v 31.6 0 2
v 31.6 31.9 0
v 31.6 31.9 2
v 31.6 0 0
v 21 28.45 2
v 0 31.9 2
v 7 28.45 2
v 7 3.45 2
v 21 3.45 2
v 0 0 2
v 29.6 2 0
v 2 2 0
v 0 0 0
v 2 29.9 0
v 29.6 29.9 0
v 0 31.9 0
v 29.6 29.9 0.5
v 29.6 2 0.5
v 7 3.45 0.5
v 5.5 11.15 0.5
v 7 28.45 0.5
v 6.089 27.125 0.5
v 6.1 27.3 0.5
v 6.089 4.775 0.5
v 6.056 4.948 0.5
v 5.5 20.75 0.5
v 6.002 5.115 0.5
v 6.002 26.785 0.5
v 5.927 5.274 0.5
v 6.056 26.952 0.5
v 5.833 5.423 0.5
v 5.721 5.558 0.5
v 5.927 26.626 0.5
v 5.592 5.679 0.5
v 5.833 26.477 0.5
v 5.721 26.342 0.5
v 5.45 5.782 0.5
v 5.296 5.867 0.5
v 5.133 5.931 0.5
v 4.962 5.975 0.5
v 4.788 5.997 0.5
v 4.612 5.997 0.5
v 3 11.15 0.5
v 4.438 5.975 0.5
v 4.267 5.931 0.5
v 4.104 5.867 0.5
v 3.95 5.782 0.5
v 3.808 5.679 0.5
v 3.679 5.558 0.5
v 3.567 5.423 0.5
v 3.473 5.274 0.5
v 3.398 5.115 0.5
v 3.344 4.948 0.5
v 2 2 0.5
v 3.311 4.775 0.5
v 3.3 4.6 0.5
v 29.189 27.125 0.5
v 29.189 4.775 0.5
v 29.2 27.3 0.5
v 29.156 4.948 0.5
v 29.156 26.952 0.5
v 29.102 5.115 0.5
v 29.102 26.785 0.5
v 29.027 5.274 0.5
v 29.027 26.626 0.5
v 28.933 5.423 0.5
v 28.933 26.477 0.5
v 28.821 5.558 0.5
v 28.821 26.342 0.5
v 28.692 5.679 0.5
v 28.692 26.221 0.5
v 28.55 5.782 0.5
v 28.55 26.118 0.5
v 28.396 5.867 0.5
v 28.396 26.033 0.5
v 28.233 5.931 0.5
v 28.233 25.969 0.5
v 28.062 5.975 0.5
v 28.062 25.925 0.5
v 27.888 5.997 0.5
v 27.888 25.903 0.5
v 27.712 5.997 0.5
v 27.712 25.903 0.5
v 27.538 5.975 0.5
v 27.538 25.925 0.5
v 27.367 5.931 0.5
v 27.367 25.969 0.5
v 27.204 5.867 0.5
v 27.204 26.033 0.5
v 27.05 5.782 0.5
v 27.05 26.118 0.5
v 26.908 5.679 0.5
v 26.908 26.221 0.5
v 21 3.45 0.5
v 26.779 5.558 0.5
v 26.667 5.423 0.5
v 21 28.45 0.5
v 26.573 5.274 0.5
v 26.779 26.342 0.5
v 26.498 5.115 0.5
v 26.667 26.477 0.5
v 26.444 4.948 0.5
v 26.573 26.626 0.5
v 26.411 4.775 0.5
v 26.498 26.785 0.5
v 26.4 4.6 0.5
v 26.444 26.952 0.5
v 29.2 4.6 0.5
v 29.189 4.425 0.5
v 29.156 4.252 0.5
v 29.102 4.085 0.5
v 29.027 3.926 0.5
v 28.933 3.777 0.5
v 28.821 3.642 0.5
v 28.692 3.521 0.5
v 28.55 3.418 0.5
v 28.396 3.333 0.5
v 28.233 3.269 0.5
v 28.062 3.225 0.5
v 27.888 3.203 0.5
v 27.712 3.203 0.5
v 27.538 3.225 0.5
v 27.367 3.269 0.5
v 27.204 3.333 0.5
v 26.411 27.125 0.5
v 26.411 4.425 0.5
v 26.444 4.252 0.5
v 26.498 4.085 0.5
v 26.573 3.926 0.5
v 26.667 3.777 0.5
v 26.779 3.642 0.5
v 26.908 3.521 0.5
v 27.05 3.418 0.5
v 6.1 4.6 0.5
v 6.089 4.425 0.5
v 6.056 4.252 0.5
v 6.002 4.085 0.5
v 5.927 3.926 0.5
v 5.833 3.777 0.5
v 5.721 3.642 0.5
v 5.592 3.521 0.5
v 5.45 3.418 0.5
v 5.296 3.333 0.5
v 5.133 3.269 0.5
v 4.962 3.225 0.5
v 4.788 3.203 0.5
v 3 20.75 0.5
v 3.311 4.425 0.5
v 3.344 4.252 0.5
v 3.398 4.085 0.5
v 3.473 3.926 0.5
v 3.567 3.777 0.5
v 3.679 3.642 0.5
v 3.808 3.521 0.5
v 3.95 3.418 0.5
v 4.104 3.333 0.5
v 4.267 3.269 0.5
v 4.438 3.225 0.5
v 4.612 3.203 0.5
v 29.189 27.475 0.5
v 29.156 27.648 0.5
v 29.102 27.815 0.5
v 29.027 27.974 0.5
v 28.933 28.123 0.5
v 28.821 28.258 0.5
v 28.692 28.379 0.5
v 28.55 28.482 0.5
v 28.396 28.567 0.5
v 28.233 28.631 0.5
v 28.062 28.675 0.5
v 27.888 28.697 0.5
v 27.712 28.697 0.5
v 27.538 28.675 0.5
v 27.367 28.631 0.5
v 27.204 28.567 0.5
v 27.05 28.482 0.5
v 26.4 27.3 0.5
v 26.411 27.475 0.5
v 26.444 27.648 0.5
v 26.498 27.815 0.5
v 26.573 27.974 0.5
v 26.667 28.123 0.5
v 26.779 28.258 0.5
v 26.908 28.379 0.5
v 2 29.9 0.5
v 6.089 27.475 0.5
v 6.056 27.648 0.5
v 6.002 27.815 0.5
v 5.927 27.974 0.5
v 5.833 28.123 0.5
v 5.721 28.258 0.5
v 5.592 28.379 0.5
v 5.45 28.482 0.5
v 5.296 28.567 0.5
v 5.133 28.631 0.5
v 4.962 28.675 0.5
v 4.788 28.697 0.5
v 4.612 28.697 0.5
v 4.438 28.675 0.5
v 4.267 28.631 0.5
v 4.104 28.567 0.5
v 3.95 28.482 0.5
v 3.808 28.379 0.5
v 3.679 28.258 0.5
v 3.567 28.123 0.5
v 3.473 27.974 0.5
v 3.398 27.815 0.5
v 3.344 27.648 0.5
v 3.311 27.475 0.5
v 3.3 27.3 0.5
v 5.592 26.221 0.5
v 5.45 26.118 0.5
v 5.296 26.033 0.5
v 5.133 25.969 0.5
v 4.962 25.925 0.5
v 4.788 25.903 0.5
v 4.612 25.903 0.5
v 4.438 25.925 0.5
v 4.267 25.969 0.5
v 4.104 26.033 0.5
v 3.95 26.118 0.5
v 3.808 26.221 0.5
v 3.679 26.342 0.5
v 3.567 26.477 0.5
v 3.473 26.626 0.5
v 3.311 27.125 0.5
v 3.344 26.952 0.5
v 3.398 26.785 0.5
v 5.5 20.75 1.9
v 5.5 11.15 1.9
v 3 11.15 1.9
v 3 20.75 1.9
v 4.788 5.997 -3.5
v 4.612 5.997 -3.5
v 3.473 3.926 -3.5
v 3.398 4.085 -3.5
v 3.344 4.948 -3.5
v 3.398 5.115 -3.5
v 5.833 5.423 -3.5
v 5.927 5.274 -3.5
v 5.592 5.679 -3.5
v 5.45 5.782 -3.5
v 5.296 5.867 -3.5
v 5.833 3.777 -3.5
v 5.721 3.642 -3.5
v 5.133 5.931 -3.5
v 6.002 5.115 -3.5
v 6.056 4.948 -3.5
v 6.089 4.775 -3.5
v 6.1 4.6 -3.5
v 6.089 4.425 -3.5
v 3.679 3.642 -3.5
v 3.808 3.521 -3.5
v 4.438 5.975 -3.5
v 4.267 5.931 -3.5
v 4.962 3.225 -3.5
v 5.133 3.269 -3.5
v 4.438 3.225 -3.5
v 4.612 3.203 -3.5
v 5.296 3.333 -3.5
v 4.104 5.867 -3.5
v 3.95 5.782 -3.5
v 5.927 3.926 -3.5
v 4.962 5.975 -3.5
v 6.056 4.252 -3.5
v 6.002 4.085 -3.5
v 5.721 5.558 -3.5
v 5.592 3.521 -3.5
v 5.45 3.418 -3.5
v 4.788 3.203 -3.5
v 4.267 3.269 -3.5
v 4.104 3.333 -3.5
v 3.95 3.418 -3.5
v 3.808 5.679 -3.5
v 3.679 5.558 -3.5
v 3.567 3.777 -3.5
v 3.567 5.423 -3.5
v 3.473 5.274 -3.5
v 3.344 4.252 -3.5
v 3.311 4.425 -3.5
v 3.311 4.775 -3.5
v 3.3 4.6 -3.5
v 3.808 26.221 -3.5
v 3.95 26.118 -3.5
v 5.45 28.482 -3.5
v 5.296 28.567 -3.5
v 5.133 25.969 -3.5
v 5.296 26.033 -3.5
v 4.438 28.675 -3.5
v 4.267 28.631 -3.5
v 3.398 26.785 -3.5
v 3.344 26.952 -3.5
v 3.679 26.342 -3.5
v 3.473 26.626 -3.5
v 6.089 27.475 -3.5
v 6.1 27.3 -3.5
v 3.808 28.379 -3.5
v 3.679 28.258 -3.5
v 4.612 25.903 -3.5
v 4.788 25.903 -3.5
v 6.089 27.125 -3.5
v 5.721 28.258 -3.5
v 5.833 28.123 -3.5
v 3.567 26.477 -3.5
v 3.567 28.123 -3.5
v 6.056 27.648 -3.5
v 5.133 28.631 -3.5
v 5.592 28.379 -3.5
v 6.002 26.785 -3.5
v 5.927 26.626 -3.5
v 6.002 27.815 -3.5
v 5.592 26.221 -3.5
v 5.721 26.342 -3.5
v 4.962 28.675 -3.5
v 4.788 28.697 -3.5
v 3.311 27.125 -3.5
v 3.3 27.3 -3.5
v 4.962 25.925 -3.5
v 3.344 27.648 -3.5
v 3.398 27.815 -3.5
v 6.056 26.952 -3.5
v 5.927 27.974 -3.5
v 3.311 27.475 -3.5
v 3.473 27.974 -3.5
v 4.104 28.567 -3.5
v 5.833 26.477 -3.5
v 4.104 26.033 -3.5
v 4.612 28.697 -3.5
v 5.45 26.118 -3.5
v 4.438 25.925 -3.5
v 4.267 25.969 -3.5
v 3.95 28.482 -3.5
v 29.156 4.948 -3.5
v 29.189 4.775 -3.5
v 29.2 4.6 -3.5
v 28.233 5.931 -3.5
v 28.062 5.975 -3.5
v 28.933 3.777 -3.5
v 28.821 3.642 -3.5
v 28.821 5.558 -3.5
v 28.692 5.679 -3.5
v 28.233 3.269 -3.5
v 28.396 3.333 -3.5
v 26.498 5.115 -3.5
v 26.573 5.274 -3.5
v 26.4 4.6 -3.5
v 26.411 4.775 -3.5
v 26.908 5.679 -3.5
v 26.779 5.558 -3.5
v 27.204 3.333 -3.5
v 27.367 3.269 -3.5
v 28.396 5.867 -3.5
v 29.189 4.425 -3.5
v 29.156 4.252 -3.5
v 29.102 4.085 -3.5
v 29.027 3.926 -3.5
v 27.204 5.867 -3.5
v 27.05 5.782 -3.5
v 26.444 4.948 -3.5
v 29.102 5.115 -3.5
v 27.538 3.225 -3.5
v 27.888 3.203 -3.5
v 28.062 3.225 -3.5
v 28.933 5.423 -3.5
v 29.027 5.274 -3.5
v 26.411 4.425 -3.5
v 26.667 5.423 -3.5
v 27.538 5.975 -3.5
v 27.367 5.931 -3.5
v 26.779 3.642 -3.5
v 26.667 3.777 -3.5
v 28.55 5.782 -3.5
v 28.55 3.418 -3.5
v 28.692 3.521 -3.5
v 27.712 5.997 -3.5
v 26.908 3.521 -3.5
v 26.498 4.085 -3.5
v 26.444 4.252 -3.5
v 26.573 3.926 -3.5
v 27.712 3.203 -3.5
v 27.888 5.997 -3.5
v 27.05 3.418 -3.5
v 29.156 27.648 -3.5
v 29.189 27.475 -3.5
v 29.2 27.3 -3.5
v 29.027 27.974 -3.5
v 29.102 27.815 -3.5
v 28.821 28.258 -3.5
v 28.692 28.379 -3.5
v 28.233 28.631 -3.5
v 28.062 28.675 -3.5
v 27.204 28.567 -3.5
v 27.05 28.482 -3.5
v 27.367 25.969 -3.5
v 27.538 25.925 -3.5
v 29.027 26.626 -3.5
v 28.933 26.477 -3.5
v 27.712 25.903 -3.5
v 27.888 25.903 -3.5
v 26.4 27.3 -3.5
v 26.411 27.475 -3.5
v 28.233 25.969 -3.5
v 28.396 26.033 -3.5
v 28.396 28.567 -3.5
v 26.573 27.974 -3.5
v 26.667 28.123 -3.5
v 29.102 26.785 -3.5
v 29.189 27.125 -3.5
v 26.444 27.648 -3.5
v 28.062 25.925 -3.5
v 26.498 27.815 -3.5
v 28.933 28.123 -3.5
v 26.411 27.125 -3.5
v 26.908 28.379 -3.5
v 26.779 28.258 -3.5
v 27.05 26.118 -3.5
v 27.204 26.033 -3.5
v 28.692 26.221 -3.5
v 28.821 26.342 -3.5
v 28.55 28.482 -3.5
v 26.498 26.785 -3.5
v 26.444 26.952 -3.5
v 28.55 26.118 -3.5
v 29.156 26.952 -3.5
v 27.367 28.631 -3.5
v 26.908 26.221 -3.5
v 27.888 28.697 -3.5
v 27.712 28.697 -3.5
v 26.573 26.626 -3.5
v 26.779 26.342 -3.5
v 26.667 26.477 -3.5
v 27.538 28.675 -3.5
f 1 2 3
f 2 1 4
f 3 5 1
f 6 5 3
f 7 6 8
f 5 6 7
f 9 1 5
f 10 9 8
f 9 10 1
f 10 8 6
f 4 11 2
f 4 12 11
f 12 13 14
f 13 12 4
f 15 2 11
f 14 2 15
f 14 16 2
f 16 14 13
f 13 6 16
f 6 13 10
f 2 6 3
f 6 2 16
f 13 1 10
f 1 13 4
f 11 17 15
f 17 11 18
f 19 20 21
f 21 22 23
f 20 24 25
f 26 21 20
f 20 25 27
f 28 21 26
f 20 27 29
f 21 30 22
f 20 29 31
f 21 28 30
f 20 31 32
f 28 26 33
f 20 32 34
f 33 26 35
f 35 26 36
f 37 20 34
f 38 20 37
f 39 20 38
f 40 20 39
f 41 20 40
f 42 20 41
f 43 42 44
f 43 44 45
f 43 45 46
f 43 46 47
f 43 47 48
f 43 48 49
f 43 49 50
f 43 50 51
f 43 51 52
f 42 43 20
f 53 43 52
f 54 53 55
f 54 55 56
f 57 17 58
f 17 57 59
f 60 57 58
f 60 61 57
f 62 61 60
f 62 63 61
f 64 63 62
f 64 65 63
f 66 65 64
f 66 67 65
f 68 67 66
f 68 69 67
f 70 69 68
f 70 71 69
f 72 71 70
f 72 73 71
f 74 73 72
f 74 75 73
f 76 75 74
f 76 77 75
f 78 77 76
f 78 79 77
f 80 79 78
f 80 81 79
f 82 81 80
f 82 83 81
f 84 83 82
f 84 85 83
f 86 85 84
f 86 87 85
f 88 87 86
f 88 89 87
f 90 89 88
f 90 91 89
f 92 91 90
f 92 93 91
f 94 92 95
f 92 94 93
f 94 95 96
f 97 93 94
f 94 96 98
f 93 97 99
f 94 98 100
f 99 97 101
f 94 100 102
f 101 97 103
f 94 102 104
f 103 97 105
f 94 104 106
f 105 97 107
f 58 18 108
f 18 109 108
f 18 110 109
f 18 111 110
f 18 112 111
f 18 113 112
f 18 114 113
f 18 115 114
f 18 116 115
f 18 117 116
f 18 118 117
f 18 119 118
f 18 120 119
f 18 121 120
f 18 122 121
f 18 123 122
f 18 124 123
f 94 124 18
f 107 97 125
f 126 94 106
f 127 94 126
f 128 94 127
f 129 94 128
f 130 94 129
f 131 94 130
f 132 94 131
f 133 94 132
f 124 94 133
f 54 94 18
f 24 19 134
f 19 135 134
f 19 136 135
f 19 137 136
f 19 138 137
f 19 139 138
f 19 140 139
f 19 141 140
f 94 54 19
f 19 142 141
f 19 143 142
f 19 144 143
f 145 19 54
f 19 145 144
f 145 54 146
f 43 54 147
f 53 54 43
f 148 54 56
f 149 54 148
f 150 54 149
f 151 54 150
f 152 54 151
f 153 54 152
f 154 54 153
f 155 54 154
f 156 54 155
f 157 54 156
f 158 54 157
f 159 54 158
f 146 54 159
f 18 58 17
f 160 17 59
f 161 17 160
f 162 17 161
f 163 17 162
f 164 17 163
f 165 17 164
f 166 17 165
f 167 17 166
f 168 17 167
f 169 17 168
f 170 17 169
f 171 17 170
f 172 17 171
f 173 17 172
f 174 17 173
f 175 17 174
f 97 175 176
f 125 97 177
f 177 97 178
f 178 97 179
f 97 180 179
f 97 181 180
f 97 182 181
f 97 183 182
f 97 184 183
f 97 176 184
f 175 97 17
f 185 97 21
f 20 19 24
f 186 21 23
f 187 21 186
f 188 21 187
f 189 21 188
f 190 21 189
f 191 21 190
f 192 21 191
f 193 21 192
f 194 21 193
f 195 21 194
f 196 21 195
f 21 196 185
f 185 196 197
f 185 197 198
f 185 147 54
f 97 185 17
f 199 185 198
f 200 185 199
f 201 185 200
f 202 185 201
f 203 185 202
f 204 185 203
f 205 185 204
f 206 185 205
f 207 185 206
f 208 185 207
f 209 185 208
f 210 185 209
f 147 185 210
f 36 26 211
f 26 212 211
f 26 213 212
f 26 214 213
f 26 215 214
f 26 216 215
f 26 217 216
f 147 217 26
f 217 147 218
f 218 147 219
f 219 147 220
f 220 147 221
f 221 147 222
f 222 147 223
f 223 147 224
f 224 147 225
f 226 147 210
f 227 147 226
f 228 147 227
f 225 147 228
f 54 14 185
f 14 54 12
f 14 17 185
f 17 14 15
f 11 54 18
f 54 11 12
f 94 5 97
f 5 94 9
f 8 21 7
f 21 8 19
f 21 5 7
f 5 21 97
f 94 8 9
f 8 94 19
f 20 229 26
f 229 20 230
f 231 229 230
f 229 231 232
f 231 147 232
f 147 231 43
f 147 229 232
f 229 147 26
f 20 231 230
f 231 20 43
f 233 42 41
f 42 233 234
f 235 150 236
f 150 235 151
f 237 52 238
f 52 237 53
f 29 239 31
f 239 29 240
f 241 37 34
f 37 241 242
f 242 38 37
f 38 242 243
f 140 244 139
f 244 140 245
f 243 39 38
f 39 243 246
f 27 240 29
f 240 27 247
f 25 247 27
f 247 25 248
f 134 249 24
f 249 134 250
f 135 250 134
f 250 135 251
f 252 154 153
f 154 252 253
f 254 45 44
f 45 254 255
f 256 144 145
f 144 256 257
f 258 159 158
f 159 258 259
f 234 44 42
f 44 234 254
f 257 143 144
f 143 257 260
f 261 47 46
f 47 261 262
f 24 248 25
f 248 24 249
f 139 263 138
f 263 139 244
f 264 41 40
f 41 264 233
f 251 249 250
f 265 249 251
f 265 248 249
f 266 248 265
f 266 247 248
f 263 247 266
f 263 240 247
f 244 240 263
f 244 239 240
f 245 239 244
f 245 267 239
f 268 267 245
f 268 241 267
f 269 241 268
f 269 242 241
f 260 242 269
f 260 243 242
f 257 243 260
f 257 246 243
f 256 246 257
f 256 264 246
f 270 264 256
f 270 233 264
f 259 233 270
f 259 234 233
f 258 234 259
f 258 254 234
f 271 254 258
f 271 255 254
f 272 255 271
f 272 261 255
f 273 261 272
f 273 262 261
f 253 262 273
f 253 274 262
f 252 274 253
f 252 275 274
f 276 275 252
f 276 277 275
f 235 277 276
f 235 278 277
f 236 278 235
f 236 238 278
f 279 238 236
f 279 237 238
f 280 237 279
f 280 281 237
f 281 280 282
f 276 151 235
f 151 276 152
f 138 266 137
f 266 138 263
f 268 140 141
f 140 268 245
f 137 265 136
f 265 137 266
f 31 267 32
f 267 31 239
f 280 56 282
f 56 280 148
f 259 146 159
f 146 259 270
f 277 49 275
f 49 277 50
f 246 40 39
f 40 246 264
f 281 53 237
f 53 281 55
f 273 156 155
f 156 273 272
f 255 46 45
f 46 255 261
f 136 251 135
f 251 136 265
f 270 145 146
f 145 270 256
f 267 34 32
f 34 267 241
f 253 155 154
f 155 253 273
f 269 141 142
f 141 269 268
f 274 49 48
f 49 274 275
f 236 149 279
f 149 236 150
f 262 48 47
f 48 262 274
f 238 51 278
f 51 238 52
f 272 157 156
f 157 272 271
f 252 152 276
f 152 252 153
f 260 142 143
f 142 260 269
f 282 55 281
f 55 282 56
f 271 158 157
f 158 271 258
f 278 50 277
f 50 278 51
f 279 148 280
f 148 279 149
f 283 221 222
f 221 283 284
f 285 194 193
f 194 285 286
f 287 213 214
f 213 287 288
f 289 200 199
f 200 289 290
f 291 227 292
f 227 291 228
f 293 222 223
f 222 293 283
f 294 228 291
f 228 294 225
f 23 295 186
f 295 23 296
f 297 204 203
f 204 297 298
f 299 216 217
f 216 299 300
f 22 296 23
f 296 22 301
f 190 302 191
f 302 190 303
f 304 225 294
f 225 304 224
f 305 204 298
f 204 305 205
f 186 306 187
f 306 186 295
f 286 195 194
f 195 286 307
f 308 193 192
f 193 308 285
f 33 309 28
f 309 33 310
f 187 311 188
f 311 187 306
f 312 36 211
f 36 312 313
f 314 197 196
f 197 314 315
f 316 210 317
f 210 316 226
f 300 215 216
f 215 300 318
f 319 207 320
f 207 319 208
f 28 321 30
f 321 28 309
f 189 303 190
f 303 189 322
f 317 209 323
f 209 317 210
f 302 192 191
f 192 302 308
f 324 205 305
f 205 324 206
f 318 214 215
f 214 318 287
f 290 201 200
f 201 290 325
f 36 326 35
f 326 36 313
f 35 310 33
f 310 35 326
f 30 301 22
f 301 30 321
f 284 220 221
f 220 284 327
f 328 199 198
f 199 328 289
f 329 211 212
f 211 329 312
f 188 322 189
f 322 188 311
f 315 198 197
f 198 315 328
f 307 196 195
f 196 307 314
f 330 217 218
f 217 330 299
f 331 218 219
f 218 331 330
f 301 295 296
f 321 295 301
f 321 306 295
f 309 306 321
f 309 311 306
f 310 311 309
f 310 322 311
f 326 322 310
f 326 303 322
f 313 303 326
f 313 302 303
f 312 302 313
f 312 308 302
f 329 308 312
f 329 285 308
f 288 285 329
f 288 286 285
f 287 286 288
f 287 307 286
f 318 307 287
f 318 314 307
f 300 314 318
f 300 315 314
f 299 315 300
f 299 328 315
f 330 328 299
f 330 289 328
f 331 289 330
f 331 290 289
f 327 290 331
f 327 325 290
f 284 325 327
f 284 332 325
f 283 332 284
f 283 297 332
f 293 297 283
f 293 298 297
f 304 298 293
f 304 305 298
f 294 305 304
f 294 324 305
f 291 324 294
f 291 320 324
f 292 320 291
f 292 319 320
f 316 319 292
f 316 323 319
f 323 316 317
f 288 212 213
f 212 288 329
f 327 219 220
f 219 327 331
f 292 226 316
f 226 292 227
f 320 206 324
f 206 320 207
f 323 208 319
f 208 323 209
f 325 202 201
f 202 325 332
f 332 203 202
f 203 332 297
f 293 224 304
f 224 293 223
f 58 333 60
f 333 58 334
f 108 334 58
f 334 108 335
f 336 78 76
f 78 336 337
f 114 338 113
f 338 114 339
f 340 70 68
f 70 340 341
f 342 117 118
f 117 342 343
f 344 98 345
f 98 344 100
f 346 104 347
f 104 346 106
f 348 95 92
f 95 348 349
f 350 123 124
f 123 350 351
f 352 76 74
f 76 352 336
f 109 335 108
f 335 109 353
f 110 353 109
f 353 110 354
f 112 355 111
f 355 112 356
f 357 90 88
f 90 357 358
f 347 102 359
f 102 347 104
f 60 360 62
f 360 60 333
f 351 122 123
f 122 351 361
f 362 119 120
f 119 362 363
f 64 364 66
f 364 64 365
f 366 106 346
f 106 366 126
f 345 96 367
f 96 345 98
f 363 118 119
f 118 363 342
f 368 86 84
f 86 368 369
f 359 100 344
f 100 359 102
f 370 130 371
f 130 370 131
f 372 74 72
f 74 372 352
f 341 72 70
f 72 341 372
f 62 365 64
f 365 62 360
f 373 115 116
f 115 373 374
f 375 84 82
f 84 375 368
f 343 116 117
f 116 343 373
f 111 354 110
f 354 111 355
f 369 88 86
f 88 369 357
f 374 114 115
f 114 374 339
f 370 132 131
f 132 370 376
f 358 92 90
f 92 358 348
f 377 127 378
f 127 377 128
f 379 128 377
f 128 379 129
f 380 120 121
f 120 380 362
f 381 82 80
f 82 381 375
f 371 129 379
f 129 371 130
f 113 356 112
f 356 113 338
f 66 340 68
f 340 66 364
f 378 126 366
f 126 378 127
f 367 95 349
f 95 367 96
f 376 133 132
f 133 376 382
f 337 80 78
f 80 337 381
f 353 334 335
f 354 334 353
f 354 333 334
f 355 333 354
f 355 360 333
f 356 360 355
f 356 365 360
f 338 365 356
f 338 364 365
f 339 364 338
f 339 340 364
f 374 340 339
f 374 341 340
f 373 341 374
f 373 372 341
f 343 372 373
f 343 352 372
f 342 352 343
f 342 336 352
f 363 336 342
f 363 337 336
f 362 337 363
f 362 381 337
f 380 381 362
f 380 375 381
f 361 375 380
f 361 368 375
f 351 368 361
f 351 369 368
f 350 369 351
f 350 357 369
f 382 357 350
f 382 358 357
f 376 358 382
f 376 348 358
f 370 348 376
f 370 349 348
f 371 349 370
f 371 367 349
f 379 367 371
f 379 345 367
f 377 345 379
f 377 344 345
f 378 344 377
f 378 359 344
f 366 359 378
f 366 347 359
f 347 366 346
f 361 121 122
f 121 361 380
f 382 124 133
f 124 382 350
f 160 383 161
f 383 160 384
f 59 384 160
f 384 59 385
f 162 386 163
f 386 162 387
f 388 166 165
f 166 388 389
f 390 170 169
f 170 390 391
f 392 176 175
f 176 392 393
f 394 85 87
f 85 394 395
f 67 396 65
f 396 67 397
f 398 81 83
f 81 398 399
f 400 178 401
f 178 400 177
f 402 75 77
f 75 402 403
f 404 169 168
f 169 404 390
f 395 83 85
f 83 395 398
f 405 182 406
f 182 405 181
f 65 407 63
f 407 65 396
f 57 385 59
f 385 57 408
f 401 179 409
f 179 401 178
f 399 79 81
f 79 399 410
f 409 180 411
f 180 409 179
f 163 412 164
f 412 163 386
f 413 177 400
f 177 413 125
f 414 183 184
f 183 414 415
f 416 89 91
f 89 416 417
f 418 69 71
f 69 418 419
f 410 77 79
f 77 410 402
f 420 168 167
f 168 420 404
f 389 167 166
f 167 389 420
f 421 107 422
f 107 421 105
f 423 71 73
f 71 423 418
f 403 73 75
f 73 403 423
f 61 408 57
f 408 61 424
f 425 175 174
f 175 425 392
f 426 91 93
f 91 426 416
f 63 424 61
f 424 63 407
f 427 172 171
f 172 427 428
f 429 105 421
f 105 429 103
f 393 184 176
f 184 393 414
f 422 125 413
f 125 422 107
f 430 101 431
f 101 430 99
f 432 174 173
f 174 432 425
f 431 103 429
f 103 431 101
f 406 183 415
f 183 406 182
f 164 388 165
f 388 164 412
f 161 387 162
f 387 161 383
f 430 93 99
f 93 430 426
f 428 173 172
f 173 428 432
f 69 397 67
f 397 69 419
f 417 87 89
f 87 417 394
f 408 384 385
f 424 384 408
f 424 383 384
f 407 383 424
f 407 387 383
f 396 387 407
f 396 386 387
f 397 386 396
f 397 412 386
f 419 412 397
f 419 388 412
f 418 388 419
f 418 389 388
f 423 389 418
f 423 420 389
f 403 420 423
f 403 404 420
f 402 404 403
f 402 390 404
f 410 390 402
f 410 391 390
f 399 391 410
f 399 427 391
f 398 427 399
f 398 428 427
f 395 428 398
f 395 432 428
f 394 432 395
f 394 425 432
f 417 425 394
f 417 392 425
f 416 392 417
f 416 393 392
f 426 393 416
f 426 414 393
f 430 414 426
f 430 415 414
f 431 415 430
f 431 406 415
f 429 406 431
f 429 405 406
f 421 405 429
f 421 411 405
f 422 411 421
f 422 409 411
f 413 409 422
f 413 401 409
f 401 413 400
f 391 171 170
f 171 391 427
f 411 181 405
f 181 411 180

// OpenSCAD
$fn = 50;

padding = 2.0;

wall_thickness = 2.0;

width = 27.9;
length = 27.6;

module ssd1306() {
  cutout_depth = 0.5;

  module surrounding() {
    l = length + padding * 2;
    w = width + padding * 2;
    h = wall_thickness;
    cube([l, w, h]);
  }

  module recess() {
    translate([padding, padding, 0]) {
      cube([length, width, cutout_depth]); 
    }
  }
  
  module pegs() {
    radius = 1.4;
    height = 4.0;
    
    // top
    translate([padding + radius + 1.3, padding + radius + 1.2, -height + cutout_depth]) {
      cylinder(height, radius * 1.0, radius);
    }
    translate([padding + radius + 1.3, padding + width - radius - 1.2, -height + cutout_depth]) {
      cylinder(height, radius * 1.0, radius);
    }
    
    // bottom
    translate([padding + length - radius - 0.4, padding + radius + 1.2, -height + cutout_depth]) {
      cylinder(height, radius * 1.0, radius);
    }
    translate([padding + length - radius - 0.4, padding + width - radius - 1.2, -height + cutout_depth]) {
      cylinder(height, radius * 1.0, radius);
    }
    
    
  }
 
  // For the screen
  module cutout() {
    l = 14.0;
    w = 25.0;
    h = 1.7;
    center = padding + width / 2;
    recessGap = 5.0;
    distanceFromCenter = w / 2;
    translate([padding + recessGap, center - distanceFromCenter, 0]) {
      cube([l, w, wall_thickness]);
    }
  }
  
  // Space for the soldered pins
  module pins() {
    l = 2.5;
    w = 9.6;
    h = 1.9;
    recessGap = 1.0;
    translate([padding + recessGap, padding + (width - w) / 2, 0]) {
      cube([l, w, h]);
    }
  }
  
  difference() {
    surrounding();
    recess();
    cutout();
    pins();
  }
  pegs();
}

ssd1306();
